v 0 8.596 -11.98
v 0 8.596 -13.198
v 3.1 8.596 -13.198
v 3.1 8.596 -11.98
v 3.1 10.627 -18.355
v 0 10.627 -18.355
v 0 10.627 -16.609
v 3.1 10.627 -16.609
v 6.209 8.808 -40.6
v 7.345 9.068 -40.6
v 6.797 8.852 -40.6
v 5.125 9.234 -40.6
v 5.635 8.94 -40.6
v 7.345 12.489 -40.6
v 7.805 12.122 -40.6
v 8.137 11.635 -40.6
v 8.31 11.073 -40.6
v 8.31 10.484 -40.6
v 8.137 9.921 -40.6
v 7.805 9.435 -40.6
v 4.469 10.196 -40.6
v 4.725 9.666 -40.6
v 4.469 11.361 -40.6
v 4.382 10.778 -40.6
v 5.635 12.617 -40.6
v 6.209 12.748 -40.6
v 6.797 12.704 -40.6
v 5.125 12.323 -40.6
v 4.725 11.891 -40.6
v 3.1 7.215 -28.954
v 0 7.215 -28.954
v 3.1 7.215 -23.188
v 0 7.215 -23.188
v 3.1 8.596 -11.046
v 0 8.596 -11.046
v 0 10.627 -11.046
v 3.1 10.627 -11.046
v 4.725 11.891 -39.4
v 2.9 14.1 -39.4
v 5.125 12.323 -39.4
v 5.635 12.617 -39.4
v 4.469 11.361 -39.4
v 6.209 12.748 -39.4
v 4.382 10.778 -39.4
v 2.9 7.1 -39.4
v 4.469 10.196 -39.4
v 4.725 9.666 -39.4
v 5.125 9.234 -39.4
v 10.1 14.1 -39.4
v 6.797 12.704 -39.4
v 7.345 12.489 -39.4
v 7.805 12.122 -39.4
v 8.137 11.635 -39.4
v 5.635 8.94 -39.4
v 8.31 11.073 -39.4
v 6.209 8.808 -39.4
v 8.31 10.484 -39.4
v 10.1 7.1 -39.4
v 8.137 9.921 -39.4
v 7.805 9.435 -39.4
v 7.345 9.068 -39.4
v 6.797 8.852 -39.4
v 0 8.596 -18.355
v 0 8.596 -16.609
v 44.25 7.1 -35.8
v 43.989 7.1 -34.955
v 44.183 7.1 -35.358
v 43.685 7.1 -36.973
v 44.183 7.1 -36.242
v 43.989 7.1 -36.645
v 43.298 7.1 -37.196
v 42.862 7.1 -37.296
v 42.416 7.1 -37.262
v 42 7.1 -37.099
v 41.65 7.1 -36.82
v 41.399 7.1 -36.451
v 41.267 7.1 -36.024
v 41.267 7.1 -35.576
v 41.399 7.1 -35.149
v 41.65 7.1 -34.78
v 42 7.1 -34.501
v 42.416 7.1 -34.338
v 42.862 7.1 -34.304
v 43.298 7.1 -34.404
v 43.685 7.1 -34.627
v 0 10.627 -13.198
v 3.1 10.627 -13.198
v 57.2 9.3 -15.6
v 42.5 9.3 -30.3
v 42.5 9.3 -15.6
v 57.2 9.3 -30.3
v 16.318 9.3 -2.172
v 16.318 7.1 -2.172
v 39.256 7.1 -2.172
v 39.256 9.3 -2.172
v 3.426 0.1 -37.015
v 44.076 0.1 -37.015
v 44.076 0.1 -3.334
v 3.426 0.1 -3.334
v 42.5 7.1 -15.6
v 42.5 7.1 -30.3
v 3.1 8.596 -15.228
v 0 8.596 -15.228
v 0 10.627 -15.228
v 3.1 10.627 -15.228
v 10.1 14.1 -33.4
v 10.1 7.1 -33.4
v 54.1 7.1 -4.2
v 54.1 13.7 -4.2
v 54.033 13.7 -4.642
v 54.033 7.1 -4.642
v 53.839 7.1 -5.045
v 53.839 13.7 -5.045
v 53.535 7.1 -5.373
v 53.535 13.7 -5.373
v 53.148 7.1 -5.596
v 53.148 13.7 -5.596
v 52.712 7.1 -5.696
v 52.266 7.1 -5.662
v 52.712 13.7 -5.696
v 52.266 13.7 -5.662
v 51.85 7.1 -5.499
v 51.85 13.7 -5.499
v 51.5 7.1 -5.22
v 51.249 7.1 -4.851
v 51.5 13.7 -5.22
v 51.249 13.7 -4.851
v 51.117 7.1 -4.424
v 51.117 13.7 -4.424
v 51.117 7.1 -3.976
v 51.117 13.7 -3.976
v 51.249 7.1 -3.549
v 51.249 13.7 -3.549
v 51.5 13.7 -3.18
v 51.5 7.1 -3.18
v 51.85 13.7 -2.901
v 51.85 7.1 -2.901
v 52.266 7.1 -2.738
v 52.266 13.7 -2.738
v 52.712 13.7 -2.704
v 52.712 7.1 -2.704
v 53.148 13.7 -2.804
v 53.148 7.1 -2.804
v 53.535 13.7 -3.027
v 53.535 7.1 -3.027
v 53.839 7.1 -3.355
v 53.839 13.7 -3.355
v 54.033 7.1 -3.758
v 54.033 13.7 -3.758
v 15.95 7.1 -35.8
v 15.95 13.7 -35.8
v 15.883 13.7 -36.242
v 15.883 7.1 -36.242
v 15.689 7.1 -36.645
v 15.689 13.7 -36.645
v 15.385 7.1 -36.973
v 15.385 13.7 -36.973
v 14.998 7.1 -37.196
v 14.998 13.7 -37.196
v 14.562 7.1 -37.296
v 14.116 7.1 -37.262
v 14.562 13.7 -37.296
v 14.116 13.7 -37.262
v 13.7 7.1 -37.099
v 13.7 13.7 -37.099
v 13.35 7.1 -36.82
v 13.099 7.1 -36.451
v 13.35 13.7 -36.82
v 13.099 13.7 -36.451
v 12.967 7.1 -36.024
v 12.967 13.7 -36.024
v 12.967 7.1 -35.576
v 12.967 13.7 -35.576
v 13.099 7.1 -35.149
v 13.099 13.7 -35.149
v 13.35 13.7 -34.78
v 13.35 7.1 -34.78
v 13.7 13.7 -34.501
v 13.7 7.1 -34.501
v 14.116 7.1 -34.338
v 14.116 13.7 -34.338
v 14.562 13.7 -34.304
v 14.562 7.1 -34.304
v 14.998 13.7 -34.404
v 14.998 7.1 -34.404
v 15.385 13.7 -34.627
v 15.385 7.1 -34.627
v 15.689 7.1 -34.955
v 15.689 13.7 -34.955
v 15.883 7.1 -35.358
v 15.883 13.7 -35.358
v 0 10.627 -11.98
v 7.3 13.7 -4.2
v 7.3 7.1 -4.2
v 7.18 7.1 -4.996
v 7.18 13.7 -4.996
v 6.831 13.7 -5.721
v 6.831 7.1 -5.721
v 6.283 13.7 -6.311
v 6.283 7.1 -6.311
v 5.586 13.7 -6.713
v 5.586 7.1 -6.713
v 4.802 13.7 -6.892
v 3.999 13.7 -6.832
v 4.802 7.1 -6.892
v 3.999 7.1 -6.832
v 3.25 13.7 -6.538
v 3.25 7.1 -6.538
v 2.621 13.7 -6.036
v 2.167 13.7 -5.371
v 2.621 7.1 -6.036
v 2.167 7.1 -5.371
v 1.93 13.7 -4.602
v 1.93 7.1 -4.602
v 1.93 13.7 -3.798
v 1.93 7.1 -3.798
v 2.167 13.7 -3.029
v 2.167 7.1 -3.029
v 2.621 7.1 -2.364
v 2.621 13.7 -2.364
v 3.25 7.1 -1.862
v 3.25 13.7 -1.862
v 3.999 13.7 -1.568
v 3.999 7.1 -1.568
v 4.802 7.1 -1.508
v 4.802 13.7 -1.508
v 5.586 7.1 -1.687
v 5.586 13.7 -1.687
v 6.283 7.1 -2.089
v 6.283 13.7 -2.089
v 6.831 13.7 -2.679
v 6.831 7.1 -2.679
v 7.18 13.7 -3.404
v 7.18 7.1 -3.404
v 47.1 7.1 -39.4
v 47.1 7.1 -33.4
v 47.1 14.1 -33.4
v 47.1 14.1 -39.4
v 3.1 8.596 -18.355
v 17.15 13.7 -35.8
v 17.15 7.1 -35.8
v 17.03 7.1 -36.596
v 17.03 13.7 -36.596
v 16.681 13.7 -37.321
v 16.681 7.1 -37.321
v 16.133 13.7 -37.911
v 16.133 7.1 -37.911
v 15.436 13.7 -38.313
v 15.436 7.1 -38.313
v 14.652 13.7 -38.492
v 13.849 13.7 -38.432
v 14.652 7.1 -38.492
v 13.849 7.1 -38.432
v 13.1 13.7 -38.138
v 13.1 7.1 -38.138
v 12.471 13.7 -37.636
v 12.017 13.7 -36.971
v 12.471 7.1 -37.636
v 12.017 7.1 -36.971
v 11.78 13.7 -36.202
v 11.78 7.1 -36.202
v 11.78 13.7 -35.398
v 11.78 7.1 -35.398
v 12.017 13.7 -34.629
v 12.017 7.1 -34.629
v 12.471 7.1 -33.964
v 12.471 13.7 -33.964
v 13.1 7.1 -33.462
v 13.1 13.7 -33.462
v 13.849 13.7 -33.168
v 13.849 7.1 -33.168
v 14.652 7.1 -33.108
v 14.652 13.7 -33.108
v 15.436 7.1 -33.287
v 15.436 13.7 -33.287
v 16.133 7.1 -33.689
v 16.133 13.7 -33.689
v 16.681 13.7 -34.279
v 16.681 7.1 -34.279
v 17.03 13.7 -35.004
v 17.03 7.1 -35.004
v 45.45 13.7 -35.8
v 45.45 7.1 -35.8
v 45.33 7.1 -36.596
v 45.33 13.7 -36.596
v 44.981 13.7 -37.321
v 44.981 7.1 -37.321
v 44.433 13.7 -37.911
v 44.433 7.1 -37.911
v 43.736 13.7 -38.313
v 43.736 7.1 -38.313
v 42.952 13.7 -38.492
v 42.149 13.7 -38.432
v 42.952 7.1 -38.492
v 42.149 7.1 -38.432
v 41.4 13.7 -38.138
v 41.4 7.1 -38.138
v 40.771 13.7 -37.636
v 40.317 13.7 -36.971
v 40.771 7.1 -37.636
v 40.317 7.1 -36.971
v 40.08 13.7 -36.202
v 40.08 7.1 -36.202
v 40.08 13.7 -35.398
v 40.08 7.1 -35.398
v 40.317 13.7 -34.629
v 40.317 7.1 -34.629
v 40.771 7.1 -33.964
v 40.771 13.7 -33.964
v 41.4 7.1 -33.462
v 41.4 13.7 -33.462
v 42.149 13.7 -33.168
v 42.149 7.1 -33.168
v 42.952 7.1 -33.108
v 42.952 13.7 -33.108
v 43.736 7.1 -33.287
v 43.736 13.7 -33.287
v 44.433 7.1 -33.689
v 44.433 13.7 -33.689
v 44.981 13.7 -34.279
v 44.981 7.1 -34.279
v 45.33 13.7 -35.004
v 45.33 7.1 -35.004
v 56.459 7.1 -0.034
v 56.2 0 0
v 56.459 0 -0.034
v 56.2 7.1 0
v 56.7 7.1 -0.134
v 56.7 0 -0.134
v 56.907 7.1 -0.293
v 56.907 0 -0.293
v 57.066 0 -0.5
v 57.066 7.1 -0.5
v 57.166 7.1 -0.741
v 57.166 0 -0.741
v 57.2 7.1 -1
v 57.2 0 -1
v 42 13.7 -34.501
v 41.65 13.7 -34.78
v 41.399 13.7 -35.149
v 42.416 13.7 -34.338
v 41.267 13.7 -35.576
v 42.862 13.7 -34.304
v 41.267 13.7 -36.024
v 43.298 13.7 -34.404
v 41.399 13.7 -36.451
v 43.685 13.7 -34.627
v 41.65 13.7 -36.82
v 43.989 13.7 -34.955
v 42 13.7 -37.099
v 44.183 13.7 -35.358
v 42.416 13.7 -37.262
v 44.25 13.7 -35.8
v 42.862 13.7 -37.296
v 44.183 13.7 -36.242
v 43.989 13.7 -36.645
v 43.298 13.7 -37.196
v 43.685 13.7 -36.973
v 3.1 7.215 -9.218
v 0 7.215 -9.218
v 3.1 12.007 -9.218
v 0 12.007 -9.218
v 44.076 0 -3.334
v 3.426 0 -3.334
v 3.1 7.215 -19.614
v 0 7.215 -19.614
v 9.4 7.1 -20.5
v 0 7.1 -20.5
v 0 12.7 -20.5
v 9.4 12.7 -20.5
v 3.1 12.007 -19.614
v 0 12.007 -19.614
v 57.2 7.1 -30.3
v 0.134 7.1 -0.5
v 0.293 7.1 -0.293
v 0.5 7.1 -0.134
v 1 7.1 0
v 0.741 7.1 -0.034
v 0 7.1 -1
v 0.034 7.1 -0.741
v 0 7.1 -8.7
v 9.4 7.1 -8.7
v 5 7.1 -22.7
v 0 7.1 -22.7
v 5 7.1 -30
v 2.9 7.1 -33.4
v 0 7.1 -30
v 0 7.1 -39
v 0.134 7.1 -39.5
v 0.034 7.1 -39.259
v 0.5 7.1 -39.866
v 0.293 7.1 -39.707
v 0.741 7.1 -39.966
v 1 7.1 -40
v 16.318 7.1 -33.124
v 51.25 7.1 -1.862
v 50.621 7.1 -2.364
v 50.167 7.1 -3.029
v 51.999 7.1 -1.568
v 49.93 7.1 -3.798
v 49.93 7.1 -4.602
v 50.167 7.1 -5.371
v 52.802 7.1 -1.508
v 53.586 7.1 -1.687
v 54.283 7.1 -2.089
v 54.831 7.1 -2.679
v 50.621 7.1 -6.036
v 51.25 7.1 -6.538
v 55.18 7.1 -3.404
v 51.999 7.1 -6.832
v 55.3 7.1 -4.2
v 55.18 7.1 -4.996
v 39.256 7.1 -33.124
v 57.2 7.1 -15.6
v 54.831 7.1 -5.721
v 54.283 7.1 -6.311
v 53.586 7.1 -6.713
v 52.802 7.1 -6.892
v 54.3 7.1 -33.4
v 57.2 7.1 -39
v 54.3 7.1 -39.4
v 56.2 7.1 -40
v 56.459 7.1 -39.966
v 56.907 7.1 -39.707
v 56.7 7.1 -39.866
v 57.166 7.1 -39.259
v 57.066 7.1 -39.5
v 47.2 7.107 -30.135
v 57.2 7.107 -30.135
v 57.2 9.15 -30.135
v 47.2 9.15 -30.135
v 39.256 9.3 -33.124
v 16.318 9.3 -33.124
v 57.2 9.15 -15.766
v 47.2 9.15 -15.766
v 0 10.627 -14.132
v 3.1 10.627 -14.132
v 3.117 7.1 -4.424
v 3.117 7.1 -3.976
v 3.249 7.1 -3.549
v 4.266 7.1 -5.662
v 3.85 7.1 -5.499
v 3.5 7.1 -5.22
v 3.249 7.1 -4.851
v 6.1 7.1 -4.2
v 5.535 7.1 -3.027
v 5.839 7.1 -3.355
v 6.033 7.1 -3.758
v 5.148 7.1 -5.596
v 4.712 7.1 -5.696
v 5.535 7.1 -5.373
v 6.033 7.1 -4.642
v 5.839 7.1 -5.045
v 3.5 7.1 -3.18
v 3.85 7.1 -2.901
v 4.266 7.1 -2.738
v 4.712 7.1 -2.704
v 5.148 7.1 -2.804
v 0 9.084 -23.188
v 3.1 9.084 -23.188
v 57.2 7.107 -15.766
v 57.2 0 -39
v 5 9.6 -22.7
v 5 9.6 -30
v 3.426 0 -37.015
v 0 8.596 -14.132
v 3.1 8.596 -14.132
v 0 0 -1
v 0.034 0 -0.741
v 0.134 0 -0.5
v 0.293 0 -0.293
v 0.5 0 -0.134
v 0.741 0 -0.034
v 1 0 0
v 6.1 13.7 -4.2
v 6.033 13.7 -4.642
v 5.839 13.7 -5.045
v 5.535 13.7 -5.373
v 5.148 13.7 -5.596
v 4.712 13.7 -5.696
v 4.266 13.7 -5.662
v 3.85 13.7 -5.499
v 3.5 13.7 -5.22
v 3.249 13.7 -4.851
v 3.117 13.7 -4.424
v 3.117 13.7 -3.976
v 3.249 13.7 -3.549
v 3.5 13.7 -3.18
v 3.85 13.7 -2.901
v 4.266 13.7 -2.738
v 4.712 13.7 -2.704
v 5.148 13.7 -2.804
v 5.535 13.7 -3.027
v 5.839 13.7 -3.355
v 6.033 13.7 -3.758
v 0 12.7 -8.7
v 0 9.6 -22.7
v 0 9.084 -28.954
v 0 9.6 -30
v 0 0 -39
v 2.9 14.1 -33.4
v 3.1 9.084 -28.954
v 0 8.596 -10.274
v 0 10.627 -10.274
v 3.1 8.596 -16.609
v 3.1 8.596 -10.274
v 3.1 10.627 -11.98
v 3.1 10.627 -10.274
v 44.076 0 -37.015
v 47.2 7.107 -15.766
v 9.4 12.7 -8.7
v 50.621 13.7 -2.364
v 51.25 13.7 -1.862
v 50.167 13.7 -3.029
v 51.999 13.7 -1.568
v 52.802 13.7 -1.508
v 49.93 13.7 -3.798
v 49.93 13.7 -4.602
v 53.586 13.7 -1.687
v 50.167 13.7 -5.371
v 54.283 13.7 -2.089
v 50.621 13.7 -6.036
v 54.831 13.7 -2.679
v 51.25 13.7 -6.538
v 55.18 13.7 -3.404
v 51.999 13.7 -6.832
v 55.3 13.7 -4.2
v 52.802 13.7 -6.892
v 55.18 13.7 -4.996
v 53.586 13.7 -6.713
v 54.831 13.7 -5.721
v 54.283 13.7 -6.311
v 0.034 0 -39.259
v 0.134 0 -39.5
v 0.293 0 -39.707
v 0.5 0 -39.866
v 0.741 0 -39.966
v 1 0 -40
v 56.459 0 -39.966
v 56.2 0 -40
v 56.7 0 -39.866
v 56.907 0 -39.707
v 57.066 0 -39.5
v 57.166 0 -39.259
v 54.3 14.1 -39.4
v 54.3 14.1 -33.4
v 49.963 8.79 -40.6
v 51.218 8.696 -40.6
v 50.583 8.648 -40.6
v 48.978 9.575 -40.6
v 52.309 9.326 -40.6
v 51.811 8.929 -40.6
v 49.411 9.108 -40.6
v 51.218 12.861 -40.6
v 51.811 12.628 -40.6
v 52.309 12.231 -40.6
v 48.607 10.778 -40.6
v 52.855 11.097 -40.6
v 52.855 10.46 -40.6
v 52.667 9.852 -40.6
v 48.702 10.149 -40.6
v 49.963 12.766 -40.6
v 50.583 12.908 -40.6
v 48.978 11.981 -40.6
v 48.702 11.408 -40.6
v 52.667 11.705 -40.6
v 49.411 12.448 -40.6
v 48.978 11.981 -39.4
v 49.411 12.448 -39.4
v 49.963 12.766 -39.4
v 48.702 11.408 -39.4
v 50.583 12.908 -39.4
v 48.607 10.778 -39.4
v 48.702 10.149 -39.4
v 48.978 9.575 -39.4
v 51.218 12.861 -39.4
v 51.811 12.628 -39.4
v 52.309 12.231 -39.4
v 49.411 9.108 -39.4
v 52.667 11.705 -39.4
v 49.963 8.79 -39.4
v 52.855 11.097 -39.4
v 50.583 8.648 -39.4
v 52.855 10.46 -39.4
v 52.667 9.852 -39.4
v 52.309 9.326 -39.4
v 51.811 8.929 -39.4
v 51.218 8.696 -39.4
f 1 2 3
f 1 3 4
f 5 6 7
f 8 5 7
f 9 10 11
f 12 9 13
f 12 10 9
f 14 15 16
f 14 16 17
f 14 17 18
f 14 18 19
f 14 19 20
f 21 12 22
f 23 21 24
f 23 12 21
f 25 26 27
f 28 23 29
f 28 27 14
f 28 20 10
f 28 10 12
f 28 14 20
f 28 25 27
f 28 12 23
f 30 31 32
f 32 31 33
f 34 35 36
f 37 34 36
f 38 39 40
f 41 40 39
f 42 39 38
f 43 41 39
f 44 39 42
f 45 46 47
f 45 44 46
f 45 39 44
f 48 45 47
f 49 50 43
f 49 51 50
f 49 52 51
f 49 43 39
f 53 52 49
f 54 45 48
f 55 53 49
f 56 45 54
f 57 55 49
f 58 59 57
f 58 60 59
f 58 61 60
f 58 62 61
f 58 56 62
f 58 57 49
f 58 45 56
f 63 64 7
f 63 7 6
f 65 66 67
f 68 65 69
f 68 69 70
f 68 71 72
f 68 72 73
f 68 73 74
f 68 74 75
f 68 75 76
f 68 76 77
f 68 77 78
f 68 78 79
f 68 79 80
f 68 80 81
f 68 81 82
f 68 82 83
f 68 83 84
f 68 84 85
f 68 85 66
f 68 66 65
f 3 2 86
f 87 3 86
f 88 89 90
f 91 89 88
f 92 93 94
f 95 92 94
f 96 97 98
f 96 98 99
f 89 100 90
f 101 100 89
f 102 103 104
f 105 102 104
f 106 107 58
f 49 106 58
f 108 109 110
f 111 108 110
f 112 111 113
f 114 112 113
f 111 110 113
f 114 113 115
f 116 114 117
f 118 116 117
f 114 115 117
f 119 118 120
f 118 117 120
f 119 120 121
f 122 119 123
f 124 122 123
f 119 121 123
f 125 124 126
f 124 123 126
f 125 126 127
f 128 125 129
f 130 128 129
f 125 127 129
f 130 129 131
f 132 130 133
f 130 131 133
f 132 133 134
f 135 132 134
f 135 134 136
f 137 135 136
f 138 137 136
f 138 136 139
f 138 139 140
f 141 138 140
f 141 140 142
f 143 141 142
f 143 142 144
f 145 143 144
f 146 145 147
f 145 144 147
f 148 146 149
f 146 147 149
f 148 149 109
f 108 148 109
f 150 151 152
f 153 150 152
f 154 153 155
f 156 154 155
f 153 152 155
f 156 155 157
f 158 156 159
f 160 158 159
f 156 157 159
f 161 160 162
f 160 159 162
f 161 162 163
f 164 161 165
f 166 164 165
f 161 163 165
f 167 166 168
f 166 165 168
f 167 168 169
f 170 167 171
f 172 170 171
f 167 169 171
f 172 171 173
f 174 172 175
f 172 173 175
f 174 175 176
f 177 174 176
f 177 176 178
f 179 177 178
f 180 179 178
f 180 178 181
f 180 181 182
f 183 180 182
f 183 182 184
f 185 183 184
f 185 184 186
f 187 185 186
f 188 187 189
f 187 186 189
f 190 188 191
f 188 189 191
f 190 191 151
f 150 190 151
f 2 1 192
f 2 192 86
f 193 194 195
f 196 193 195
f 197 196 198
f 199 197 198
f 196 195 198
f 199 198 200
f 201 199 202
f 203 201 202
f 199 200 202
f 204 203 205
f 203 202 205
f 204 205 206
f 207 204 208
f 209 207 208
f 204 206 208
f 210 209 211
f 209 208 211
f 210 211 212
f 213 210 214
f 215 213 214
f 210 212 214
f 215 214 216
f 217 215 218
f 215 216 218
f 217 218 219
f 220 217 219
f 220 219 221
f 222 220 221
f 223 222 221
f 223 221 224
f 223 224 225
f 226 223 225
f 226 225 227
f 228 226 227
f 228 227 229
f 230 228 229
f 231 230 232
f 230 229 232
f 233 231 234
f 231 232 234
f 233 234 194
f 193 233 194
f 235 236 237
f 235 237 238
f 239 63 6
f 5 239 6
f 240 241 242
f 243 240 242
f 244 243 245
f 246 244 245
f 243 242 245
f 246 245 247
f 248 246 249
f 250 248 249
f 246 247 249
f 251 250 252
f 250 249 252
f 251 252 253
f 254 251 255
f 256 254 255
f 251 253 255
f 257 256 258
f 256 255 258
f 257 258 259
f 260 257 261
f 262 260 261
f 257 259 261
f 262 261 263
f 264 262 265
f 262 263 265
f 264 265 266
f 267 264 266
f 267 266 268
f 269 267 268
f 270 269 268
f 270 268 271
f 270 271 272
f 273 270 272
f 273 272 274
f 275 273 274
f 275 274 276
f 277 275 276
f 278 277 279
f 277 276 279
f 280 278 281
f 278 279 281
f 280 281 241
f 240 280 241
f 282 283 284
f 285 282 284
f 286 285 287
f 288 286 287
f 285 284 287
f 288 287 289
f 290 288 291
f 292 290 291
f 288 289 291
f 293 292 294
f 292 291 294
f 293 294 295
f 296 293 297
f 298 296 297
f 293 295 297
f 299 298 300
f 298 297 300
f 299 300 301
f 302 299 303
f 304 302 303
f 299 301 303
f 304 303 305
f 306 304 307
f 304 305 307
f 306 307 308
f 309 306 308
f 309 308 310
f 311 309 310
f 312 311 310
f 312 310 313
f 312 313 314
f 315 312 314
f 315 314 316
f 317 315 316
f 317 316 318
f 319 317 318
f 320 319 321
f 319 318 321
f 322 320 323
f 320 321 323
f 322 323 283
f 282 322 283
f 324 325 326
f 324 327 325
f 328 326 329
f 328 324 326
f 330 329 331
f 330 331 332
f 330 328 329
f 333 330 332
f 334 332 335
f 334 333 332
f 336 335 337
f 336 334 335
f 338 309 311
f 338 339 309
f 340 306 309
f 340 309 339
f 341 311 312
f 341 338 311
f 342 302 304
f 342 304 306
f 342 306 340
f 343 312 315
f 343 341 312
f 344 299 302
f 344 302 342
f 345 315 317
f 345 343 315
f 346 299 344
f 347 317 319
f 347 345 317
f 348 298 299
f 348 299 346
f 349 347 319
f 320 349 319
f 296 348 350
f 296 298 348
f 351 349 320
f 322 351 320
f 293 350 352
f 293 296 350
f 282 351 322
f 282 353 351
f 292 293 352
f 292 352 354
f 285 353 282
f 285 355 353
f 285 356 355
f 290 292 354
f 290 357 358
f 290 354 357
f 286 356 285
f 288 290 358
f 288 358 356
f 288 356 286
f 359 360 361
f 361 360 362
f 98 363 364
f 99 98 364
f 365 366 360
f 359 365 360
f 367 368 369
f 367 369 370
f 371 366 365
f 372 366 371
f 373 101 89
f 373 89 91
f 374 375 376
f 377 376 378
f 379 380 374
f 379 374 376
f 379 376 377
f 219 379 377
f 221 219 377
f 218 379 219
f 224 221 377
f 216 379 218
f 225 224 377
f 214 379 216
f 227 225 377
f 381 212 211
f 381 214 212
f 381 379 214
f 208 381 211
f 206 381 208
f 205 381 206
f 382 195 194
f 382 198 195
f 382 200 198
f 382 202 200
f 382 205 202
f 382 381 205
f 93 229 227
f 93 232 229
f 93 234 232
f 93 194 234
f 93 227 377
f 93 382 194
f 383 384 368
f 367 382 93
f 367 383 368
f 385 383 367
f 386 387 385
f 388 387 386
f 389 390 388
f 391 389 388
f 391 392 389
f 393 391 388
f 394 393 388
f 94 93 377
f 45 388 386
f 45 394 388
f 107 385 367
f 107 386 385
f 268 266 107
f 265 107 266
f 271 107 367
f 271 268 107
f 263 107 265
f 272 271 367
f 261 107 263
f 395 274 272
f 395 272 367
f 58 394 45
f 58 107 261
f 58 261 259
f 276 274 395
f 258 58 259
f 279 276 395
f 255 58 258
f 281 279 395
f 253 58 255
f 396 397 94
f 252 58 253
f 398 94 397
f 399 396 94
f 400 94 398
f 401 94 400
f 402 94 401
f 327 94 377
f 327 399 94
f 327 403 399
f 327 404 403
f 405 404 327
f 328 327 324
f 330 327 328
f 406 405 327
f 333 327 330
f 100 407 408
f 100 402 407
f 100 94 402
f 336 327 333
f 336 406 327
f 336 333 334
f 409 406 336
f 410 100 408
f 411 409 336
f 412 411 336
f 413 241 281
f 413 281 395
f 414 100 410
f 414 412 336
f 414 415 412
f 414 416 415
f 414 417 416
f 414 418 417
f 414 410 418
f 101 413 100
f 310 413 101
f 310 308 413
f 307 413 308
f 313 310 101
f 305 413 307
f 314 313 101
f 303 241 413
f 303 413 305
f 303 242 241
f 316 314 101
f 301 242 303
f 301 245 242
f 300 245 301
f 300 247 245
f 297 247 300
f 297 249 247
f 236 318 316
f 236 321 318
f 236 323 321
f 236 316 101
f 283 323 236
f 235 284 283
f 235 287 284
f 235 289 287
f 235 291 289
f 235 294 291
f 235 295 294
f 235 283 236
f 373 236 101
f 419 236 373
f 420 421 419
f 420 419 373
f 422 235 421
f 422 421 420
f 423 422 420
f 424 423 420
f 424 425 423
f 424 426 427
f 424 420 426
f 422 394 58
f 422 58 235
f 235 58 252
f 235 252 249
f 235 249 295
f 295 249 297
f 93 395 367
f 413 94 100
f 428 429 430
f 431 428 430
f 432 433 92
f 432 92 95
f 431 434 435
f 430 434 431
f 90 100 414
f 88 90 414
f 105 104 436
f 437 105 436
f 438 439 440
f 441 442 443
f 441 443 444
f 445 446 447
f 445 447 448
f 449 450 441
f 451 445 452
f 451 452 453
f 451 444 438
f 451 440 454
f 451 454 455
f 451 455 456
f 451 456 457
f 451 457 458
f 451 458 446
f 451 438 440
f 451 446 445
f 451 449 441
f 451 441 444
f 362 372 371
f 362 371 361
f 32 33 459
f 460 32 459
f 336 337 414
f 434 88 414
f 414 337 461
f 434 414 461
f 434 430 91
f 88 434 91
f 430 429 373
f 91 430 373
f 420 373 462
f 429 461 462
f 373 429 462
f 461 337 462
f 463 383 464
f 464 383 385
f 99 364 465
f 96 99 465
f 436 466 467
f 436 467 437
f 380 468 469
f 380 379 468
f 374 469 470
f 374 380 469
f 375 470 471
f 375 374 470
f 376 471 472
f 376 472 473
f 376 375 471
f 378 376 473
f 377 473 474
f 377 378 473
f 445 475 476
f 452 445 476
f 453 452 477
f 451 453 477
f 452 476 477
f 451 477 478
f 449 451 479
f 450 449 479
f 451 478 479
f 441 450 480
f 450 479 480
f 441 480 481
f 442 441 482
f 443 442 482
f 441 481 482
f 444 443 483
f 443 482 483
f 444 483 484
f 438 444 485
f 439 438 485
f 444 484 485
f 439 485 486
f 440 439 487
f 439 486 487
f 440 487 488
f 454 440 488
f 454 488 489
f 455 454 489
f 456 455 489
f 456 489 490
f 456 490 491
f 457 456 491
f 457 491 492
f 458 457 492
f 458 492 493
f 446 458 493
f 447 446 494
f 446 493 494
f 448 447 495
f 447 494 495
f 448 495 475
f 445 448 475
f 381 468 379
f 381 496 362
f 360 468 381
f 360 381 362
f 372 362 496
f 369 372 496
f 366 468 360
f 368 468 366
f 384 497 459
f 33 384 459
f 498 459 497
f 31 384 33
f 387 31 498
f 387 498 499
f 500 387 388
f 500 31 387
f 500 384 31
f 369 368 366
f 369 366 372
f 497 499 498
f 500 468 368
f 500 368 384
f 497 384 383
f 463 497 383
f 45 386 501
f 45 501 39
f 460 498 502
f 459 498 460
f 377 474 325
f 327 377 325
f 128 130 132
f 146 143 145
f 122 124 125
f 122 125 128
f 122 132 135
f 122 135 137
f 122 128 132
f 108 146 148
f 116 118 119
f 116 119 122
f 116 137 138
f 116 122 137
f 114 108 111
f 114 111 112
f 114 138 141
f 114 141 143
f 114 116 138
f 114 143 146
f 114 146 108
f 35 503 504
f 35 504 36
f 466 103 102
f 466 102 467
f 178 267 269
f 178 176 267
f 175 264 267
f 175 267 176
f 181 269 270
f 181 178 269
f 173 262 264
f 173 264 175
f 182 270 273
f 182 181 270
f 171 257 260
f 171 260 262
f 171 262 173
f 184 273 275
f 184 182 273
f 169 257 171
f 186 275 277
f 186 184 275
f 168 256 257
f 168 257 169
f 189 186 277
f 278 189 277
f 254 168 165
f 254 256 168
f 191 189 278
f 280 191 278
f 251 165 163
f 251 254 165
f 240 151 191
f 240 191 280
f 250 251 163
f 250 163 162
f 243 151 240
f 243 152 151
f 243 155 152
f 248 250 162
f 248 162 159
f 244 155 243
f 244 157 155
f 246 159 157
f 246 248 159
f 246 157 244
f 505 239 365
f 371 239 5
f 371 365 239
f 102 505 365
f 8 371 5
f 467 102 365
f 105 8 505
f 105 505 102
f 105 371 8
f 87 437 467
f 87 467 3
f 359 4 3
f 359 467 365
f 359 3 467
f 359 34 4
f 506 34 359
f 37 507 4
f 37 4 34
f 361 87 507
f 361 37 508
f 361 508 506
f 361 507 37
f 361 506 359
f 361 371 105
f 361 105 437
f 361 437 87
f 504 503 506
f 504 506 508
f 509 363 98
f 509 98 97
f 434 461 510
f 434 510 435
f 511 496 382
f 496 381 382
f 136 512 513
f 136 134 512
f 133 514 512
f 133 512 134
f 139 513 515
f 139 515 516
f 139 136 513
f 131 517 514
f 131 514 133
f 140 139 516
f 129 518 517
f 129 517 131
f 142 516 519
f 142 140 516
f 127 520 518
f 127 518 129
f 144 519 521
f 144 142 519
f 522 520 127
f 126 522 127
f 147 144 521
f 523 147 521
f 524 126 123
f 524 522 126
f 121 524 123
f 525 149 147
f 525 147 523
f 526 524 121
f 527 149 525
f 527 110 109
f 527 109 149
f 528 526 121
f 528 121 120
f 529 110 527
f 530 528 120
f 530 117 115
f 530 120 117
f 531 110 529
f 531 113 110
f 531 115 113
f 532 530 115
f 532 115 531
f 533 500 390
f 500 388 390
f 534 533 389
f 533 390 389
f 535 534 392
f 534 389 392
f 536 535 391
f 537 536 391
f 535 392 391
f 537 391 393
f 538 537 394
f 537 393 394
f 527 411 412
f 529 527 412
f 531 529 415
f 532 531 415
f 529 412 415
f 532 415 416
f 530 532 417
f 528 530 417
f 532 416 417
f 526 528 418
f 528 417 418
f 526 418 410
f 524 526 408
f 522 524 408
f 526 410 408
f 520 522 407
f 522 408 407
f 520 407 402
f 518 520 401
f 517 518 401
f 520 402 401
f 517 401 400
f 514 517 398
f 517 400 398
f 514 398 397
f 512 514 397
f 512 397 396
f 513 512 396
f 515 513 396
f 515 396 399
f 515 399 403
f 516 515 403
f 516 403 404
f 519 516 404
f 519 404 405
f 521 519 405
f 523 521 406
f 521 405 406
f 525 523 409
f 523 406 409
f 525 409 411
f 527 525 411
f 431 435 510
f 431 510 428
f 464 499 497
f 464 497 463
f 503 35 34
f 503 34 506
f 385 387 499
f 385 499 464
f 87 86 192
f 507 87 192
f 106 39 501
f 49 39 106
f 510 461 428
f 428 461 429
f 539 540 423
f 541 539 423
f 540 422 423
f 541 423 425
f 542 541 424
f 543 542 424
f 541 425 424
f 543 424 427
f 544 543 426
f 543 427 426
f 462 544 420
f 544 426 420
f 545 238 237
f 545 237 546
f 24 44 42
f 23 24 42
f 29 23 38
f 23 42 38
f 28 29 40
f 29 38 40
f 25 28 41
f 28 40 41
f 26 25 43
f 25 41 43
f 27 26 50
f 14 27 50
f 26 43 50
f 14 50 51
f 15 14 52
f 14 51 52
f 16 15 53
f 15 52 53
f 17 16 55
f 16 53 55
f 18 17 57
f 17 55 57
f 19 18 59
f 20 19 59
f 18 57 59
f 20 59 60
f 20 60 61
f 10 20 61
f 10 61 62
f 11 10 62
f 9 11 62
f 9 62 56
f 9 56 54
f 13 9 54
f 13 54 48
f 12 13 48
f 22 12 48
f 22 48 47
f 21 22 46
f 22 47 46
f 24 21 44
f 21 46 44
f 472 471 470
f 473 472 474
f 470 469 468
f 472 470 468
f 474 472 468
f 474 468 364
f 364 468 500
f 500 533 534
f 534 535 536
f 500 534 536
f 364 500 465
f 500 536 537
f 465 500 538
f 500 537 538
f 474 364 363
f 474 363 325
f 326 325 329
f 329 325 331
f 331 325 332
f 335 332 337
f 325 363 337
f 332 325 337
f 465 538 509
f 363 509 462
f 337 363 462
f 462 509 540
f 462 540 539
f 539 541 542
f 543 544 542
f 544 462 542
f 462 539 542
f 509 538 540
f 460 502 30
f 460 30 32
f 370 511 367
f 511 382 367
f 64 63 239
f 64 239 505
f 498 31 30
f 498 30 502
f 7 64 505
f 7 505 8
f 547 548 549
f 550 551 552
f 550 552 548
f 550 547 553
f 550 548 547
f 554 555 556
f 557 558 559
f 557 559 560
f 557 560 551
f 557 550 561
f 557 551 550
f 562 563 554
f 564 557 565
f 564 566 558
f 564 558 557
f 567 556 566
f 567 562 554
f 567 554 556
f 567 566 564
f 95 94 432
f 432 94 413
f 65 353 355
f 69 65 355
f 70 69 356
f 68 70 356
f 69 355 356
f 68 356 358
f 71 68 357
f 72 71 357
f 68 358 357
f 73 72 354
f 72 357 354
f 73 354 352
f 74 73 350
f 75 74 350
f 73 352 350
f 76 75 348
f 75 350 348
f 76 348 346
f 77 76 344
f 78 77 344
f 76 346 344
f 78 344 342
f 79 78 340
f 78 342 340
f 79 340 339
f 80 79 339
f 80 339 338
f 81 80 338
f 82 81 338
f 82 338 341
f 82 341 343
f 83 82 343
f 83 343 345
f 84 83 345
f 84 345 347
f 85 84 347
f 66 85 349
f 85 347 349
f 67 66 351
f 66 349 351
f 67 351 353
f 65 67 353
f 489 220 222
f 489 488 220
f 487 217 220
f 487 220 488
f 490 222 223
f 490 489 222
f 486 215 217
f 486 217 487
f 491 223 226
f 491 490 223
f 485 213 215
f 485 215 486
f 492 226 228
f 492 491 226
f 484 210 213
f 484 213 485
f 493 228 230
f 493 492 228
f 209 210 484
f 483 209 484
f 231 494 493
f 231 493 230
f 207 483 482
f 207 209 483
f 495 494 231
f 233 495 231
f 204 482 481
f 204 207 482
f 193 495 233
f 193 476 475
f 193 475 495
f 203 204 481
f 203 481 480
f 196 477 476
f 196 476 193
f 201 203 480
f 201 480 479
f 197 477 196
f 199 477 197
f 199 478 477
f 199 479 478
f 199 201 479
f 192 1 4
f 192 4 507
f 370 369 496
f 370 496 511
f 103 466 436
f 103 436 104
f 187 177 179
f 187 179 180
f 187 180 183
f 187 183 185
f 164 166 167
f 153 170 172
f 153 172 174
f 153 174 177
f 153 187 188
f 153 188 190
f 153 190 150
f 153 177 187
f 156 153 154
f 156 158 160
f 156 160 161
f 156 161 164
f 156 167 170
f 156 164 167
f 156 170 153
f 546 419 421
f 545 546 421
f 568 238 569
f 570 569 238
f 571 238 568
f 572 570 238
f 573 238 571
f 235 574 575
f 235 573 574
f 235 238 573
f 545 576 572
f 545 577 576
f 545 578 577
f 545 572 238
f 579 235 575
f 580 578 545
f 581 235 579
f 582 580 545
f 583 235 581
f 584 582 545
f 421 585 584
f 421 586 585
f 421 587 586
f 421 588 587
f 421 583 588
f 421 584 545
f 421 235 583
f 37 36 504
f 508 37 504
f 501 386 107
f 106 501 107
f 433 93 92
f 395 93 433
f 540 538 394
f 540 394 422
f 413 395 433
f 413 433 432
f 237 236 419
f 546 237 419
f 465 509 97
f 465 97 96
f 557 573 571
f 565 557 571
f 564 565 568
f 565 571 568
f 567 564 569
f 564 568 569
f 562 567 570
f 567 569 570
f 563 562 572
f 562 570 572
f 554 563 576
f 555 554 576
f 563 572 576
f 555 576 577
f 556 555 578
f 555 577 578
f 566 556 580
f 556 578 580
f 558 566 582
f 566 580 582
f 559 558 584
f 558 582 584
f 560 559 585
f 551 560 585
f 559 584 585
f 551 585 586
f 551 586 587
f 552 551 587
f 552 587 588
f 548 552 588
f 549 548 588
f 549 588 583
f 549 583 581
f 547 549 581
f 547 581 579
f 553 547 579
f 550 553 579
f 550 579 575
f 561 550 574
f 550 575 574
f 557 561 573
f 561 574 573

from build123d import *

# Parameters (mm, degrees)
ESBO_O1_W                = 57.2
ESBO_O1_H                = 40
RESSALTO_EXTRUS_O1_DEPTH = 7.1
ESBO_O2_R                = 2.7
RESSALTO_EXTRUS_O2_DEPTH = 6.6
ESBO_O3_R                = 1.5
CORTE_EXTRUS_O1_DEPTH    = 6.6
ESBO_O4_W                = 40.649985971
ESBO_O4_H                = 33.681416947
CORTE_EXTRUS_O2_DEPTH    = 0.1
ESBO_O5_W                = 14.7
ESBO_O5_H                = 14.7
RESSALTO_EXTRUS_O3_DEPTH = 2.2
ESBO_O6_W                = 14.368584986
ESBO_O6_H                = 2.042443489
CORTE_EXTRUS_O3_DEPTH    = 10
ESBO_O7_W                = 9.4
ESBO_O7_H                = 11.8
ESBO_O7_W_2              = 5
ESBO_O7_H_2              = 7.3
RESSALTO_EXTRUS_O4_DEPTH = 2.5
ESBO_O8_W                = 9.4
ESBO_O8_H                = 11.8
RESSALTO_EXTRUS_O5_DEPTH = 3.1
ESBO_O9_W                = 5.766531476
ESBO_O9_H                = 1.868031324
ESBO_O9_W_2              = 10.396000408
ESBO_O9_H_2              = 4.791906438
ESBO_O9_W_3              = 1.746203194
ESBO_O9_H_3              = 2.030468829
ESBO_O9_W_4              = 1.096453168
ESBO_O9_W_5              = 1.218281297
ESBO_O9_W_6              = 0.771578155
CORTE_EXTRUS_O4_DEPTH    = 3.1
FILETE1_R                = 1
ESBO_O10_W               = 22.938206369
ESBO_O10_H               = 30.952060747
RESSALTO_EXTRUS_O6_DEPTH = 2.2
ESBO_O11_W               = 7.2
ESBO_O11_H               = 6
RESSALTO_EXTRUS_O7_DEPTH = 7
ESBO_O12_R               = 2.135826149
ESBO_O12_R_2             = 1.975311567
RESSALTO_EXTRUS_O8_DEPTH = 1.2


with BuildPart() as part:
    # Esboço1 → Ressalto-extrusão1 (new body)
    with BuildSketch(Plane(origin=(0, 0, 0), x_dir=(1, 0, 0), z_dir=(0, 1, 0))):
        with Locations((28.6, 20)):
            Rectangle(ESBO_O1_W, ESBO_O1_H)
    extrude(amount=RESSALTO_EXTRUS_O1_DEPTH)

    # Esboço2 → Ressalto-extrusão2 (add)
    with BuildSketch(Plane(origin=(0, 7.1, 0), x_dir=(1, 0, 0), z_dir=(0, 1, 0))):
        with Locations((4.6, 4.2)):
            Circle(ESBO_O2_R)
        with Locations((52.6, 4.2)):
            Circle(ESBO_O2_R)
        with Locations((42.75, 35.8)):
            Circle(ESBO_O2_R)
        with Locations((14.45, 35.8)):
            Circle(ESBO_O2_R)
    extrude(amount=RESSALTO_EXTRUS_O2_DEPTH)

    # Esboço3 → Corte-extrusão1 (cut)
    with BuildSketch(Plane(origin=(0, 13.7, 0), x_dir=(1, 0, 0), z_dir=(0, 1, 0))):
        with Locations((14.45, 35.8)):
            Circle(ESBO_O3_R)
        with Locations((42.75, 35.8)):
            Circle(ESBO_O3_R)
        with Locations((52.6, 4.2)):
            Circle(ESBO_O3_R)
        with Locations((4.6, 4.2)):
            Circle(ESBO_O3_R)
    extrude(amount=-CORTE_EXTRUS_O1_DEPTH, mode=Mode.SUBTRACT)

    # Esboço4 → Corte-extrusão2 (cut)
    with BuildSketch(Plane(origin=(0, 0, 0), x_dir=(-1, 0, 0), z_dir=(0, -1, 0))):
        with Locations((-23.751037388, 20.174214226)):
            Rectangle(ESBO_O4_W, ESBO_O4_H)
    extrude(amount=-CORTE_EXTRUS_O2_DEPTH, mode=Mode.SUBTRACT)

    # Esboço5 → Ressalto-extrusão3 (add)
    with BuildSketch(Plane(origin=(0, 7.1, 0), x_dir=(1, 0, 0), z_dir=(0, 1, 0))):
        with Locations((49.85, 22.95)):
            Rectangle(ESBO_O5_W, ESBO_O5_H)
    extrude(amount=RESSALTO_EXTRUS_O3_DEPTH)

    # Esboço6 → Corte-extrusão3 (cut)
    with BuildSketch(Plane(origin=(57.2, 0, 0), x_dir=(0, 0, -1), z_dir=(1, 0, 0))):
        with Locations((22.950407173, 8.128512291)):
            Rectangle(ESBO_O6_W, ESBO_O6_H)
    extrude(amount=-CORTE_EXTRUS_O3_DEPTH, mode=Mode.SUBTRACT)

    # Esboço7 → Ressalto-extrusão4 (add)
    with BuildSketch(Plane(origin=(0, 7.1, 0), x_dir=(1, 0, 0), z_dir=(0, 1, 0))):
        with Locations((4.7, 14.6)):
            Rectangle(ESBO_O7_W, ESBO_O7_H)
        with Locations((2.5, 26.35)):
            Rectangle(ESBO_O7_W_2, ESBO_O7_H_2)
    extrude(amount=RESSALTO_EXTRUS_O4_DEPTH)

    # Esboço8 → Ressalto-extrusão5 (add)
    with BuildSketch(Plane(origin=(0, 9.6, 0), x_dir=(1, 0, 0), z_dir=(0, 1, 0))):
        with Locations((4.7, 14.6)):
            Rectangle(ESBO_O8_W, ESBO_O8_H)
    extrude(amount=RESSALTO_EXTRUS_O5_DEPTH)

    # Esboço9 → Corte-extrusão4 (cut)
    with BuildSketch(Plane.ZY):
        with Locations((-26.071101801, 8.149500051)):
            Rectangle(ESBO_O9_W, ESBO_O9_H)
        with Locations((-14.416210718, 9.611437608)):
            Rectangle(ESBO_O9_W_2, ESBO_O9_H_2)
        with Locations((-17.482218651, 9.611437609)):
            Rectangle(ESBO_O9_W_3, ESBO_O9_H_3, mode=Mode.SUBTRACT)
        with Locations((-14.680171666, 9.611437609)):
            Rectangle(ESBO_O9_W_4, ESBO_O9_H_3, mode=Mode.SUBTRACT)
        with Locations((-12.588788772, 9.611437609)):
            Rectangle(ESBO_O9_W_5, ESBO_O9_H_3, mode=Mode.SUBTRACT)
        with Locations((-10.659843384, 9.611437609)):
            Rectangle(ESBO_O9_W_6, ESBO_O9_H_3, mode=Mode.SUBTRACT)
    extrude(amount=-CORTE_EXTRUS_O4_DEPTH, mode=Mode.SUBTRACT)

    # Filete1
    filete1_edges = [part.edges().sort_by_distance(p)[0] for p in [
        (0, 3.55, -40),
        (57.2, 3.55, -40),
        (57.2, 3.55, 0),
        (0, 3.55, 0),
    ]]
    fillet(filete1_edges, radius=FILETE1_R)

    # Esboço10 → Ressalto-extrusão6 (add)
    with BuildSketch(Plane(origin=(0, 7.1, 0), x_dir=(1, 0, 0), z_dir=(0, 1, 0))):
        with Locations((27.787000281, 17.648107954)):
            Rectangle(ESBO_O10_W, ESBO_O10_H)
    extrude(amount=RESSALTO_EXTRUS_O6_DEPTH)

    # Esboço11 → Ressalto-extrusão7 (add)
    with BuildSketch(Plane(origin=(0, 7.1, 0), x_dir=(1, 0, 0), z_dir=(0, 1, 0))):
        with Locations((6.5, 36.4)):
            Rectangle(ESBO_O11_W, ESBO_O11_H)
        with Locations((50.7, 36.4)):
            Rectangle(ESBO_O11_W, ESBO_O11_H)
    extrude(amount=RESSALTO_EXTRUS_O7_DEPTH)

    # Esboço12 → Ressalto-extrusão8 (add)
    with BuildSketch(Plane(origin=(0, 0, -39.4), x_dir=(-1, 0, 0), z_dir=(0, 0, -1))):
        with Locations((-50.742973547, 10.778272234)):
            Circle(ESBO_O12_R)
        with Locations((-6.357026453, 10.778272234)):
            Circle(ESBO_O12_R_2)
    extrude(amount=RESSALTO_EXTRUS_O8_DEPTH)


solid = part.part
